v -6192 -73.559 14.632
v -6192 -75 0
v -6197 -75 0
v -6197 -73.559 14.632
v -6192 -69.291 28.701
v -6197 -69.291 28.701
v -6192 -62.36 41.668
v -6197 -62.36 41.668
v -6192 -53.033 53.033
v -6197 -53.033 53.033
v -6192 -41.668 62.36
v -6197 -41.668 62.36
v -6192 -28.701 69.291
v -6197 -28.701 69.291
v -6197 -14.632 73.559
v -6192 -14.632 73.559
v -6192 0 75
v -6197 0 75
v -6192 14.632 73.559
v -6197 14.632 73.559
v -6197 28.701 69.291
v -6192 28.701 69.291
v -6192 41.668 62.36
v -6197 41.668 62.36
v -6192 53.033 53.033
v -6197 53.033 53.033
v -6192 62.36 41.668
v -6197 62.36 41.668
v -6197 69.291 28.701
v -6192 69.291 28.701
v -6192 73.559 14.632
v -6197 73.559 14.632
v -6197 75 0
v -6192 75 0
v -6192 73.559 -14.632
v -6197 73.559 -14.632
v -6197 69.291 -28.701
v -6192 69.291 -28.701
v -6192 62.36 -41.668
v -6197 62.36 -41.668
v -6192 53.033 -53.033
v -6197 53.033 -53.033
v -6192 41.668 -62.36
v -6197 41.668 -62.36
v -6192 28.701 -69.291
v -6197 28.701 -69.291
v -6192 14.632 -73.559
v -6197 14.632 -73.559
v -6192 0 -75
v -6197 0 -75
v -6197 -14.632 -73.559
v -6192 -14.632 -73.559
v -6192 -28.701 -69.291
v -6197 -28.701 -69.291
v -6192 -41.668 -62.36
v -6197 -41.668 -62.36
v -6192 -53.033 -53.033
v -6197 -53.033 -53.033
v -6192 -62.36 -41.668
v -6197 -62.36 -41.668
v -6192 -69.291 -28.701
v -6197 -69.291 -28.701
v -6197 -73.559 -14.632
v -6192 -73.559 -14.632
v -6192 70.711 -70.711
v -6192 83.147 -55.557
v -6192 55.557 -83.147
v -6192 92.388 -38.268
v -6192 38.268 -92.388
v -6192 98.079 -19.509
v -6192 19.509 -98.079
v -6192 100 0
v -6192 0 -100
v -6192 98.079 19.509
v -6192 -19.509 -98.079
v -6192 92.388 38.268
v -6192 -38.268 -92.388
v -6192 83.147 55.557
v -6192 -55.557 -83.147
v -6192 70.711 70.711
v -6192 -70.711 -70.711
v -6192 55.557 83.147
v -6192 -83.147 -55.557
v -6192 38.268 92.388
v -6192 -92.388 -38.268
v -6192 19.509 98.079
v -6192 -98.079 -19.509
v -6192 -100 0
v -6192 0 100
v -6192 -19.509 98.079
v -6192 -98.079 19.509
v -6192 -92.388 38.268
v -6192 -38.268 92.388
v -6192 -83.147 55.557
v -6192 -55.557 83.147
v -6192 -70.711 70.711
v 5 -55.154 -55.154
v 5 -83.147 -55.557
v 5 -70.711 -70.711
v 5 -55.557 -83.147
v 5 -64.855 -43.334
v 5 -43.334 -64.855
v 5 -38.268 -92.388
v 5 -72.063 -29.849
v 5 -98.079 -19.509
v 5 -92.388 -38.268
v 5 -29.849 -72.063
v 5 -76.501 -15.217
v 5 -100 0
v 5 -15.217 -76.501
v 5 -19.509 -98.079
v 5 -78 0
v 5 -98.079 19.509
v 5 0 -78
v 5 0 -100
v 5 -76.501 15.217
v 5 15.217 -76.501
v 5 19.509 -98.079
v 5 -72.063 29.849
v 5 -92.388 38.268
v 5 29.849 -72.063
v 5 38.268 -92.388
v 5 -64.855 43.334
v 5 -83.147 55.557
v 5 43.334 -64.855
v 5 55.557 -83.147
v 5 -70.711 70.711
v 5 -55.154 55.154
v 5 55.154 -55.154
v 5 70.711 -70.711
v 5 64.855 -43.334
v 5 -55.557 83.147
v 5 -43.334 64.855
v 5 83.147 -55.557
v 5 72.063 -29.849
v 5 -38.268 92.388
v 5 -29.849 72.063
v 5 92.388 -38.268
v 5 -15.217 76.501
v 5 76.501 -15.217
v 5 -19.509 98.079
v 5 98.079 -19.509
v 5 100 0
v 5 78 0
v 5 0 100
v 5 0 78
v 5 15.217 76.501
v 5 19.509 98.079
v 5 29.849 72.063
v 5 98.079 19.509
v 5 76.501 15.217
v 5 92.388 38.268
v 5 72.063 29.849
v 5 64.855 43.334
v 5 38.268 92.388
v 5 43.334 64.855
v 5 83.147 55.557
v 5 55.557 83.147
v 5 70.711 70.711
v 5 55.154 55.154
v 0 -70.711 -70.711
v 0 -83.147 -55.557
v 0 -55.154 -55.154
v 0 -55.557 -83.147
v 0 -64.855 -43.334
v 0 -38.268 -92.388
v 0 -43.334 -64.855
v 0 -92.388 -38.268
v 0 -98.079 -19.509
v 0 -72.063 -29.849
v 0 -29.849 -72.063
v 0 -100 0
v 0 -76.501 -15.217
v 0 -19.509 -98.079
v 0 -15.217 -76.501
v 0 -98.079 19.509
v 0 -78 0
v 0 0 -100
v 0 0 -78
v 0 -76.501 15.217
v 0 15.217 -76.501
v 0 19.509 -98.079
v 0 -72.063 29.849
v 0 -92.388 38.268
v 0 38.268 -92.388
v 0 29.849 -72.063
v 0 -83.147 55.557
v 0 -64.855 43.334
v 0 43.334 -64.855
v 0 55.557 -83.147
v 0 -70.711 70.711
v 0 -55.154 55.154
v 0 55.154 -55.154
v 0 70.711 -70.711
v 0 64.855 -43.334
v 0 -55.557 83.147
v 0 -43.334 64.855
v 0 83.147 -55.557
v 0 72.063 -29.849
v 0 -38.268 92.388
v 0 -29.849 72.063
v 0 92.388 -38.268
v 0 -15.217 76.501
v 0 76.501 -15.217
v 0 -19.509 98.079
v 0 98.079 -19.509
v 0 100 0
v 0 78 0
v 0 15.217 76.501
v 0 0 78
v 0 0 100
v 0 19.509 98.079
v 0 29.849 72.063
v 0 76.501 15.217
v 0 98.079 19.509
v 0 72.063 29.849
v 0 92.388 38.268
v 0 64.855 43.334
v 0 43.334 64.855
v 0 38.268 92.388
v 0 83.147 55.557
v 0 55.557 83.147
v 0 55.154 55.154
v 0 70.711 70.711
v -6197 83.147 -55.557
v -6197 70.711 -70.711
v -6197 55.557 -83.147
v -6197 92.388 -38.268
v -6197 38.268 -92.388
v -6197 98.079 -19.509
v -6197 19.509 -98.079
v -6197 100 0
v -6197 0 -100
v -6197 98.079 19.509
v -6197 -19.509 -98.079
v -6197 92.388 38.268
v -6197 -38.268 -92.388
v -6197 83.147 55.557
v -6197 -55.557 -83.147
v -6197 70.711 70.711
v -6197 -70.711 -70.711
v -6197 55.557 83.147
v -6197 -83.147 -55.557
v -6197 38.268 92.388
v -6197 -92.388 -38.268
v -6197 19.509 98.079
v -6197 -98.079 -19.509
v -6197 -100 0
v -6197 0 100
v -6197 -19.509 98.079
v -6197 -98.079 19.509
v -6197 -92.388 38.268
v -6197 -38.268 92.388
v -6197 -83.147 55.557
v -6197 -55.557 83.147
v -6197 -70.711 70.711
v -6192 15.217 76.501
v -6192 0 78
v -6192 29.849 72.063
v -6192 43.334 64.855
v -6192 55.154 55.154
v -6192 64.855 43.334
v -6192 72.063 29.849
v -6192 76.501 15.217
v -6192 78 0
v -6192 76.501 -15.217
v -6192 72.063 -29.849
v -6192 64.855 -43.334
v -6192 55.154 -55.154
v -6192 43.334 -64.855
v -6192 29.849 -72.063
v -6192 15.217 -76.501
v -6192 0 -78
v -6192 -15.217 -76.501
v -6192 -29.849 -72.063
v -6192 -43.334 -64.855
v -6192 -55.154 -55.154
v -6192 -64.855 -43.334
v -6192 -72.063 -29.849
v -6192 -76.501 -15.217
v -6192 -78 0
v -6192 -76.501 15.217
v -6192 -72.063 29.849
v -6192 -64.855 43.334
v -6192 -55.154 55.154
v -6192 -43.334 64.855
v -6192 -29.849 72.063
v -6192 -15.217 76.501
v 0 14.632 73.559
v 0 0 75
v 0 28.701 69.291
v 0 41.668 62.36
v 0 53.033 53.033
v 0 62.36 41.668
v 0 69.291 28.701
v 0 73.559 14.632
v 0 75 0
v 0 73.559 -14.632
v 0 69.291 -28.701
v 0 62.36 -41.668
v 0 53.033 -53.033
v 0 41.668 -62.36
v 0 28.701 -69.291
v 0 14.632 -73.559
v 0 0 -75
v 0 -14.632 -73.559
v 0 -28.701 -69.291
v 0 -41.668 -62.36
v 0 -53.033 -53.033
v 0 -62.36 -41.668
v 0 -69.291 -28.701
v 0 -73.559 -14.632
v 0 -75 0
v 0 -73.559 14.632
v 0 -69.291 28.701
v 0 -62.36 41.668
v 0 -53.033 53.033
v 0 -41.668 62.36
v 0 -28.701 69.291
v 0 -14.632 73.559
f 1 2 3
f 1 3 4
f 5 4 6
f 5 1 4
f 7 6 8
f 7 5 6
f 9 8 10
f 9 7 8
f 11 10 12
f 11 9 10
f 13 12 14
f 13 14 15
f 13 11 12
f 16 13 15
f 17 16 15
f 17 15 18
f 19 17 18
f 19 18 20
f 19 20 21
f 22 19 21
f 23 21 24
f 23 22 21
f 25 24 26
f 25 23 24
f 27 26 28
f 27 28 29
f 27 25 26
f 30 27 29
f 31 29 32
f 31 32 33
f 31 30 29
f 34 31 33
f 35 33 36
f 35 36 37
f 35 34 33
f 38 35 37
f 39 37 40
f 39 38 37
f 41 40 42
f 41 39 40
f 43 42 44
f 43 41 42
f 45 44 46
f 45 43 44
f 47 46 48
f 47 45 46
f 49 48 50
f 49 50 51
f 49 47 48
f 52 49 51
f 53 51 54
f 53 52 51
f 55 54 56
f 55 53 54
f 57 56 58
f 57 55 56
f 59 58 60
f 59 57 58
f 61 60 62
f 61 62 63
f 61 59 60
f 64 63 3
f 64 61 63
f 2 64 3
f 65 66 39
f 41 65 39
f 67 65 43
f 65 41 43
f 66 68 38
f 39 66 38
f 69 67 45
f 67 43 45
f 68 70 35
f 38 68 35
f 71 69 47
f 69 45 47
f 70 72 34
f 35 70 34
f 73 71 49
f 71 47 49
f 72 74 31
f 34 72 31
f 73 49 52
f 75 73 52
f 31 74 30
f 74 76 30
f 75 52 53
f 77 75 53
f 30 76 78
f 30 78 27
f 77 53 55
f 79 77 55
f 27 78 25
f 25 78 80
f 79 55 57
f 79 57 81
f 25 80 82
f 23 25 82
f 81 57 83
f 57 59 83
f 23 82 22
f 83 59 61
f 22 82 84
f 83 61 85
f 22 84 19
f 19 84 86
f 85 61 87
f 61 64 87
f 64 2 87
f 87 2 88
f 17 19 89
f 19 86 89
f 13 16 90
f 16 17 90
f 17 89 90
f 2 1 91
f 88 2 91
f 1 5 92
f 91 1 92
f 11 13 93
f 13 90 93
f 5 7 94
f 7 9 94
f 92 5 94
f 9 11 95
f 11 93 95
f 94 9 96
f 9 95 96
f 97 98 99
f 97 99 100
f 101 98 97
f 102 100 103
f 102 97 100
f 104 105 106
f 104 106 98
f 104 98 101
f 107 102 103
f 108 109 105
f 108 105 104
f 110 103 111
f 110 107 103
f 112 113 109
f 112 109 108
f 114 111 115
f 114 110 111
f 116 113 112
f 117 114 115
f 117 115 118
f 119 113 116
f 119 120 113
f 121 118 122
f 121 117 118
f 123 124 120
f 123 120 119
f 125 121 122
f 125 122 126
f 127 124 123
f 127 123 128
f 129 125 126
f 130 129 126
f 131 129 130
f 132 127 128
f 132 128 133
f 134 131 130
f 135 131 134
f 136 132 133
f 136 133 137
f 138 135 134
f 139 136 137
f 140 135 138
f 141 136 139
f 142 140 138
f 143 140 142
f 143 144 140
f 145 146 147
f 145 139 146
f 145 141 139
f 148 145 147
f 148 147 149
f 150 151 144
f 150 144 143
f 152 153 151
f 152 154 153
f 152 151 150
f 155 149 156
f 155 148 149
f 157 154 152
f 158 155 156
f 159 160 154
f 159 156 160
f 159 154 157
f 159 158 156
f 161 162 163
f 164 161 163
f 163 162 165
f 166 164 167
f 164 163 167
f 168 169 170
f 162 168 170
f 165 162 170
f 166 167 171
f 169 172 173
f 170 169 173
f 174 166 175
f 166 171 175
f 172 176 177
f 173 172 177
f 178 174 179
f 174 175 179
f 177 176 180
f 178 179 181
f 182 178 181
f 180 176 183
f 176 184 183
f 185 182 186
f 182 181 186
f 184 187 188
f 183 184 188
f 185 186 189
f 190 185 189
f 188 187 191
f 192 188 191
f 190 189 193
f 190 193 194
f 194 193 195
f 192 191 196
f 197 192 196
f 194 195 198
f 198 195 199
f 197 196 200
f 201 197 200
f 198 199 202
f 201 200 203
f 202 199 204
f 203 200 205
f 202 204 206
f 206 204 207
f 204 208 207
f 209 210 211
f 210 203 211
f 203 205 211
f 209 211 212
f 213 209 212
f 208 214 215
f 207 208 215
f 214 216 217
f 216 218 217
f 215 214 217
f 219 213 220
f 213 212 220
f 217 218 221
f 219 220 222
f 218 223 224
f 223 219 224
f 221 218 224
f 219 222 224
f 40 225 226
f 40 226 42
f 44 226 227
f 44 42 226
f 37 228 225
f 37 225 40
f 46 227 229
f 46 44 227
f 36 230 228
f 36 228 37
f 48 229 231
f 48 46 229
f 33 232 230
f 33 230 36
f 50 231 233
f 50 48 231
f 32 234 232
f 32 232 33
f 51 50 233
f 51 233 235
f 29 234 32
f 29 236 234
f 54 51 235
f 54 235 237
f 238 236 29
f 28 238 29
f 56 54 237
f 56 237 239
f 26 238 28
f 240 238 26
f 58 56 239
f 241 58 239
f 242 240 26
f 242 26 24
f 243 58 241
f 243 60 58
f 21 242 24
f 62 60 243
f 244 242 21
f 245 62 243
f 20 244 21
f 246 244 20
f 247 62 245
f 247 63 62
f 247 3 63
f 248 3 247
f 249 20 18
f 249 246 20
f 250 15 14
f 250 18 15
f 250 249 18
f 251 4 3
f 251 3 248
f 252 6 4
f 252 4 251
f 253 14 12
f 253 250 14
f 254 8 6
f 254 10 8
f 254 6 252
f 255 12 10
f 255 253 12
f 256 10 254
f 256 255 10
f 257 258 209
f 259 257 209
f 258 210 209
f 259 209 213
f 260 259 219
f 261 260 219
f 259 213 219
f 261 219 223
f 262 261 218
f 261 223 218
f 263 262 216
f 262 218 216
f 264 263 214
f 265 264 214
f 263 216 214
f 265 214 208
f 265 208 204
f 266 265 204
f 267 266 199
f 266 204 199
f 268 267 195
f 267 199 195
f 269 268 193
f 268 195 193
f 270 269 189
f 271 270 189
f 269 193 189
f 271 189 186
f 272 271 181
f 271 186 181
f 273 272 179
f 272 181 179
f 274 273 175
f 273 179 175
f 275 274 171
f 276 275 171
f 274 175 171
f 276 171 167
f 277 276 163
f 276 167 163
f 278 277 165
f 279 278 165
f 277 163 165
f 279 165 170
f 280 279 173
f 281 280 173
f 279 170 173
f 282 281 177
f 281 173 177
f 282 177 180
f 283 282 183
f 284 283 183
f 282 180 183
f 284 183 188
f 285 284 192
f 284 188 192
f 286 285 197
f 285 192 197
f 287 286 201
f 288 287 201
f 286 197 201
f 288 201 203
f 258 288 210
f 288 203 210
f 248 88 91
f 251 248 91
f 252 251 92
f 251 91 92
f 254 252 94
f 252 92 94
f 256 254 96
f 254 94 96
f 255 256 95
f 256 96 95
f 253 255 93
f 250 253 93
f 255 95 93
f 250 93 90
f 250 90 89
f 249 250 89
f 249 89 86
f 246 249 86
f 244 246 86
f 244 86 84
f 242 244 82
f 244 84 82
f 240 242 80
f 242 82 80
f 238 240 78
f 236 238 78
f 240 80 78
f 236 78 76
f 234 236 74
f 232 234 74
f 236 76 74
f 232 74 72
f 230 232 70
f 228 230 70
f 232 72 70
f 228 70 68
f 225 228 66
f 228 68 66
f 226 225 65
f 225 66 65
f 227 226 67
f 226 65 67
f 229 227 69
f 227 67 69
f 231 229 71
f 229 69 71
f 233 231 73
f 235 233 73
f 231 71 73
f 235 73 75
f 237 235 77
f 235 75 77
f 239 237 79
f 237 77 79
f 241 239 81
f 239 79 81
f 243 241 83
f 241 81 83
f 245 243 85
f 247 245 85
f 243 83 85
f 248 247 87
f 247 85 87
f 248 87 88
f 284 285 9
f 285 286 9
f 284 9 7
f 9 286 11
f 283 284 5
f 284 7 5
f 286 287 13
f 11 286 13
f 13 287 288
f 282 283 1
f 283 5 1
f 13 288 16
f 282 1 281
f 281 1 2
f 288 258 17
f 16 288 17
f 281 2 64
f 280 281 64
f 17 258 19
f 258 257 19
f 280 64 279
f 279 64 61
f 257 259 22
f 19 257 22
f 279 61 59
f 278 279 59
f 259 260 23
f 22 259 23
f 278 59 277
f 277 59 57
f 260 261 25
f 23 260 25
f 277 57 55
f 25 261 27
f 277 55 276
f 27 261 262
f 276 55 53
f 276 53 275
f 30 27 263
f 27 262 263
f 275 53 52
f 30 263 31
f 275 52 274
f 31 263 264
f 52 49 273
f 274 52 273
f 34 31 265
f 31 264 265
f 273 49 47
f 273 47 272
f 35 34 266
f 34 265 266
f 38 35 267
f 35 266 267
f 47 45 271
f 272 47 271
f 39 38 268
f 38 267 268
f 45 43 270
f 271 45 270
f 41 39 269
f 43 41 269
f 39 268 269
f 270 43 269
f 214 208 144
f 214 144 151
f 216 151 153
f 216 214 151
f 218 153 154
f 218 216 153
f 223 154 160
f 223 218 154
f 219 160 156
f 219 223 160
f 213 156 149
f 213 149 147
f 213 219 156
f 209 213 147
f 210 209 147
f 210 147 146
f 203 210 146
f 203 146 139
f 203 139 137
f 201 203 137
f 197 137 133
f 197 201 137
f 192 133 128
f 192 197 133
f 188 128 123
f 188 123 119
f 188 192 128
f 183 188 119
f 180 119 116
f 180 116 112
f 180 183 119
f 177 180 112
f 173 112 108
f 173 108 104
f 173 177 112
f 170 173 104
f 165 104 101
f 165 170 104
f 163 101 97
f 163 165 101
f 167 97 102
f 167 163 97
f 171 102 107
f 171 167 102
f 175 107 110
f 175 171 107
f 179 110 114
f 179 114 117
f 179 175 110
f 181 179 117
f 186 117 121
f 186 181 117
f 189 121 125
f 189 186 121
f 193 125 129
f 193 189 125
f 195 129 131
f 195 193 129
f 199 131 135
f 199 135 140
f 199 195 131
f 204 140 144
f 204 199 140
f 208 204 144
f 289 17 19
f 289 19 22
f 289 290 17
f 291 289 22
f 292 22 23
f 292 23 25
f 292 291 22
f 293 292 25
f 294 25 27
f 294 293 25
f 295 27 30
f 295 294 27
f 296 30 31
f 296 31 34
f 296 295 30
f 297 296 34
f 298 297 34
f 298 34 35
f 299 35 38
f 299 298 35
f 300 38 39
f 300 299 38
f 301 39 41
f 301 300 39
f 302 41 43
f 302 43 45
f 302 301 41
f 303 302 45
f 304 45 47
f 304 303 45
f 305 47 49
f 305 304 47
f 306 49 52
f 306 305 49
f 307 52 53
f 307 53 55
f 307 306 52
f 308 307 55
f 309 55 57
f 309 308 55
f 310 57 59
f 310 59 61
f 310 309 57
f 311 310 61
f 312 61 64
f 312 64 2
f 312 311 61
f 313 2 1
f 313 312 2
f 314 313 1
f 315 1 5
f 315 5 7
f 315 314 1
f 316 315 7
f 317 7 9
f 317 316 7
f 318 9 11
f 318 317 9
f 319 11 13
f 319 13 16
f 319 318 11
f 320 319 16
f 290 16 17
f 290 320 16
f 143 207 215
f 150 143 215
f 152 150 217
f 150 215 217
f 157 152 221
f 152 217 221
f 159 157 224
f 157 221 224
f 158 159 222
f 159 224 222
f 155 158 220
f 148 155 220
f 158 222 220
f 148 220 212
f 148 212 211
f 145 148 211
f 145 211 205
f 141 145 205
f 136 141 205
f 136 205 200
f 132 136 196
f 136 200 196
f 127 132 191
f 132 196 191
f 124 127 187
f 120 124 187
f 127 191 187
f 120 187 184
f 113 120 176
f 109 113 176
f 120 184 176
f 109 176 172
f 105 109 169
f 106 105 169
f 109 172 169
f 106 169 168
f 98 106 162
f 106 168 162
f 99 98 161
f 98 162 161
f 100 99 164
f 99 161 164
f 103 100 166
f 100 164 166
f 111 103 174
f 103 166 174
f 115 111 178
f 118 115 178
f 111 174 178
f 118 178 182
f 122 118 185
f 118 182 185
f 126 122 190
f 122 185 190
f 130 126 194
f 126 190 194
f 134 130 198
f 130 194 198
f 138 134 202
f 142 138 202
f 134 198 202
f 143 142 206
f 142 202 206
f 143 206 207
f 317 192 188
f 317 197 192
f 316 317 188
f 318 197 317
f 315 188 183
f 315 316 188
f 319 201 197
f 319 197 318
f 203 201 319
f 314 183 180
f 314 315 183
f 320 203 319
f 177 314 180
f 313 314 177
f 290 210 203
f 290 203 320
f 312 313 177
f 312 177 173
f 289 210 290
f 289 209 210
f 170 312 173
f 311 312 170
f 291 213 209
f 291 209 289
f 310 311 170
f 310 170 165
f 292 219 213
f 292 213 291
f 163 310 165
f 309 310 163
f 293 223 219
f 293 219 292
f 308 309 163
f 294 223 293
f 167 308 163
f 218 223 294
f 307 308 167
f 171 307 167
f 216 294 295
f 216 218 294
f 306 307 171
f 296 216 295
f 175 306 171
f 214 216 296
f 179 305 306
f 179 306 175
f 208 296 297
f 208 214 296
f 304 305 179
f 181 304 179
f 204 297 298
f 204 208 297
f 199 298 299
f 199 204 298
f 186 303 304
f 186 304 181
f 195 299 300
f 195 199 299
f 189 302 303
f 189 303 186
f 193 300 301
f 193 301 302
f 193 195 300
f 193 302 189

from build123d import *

# Parameters (mm, degrees)
F0_W     = 6192
F0_H     = 3
F2_R     = 100
F2_R_2   = 78
F2_R_3   = 75
F3_DEPTH = 5
F4_R     = 100
F4_R_2   = 78
F5_DEPTH = 5


with BuildPart() as f1:
    # F0 (on Front) → F1 (revolve)
    with BuildSketch(Plane.XZ):
        with Locations((-3096, 76.5)):
            Rectangle(F0_W, F0_H)
    revolve(axis=Axis((-3096, 0, 0), (-1, 0, 0)))


with BuildPart() as f3:
    # F2 (on face) → F3 (new body)
    with BuildSketch(Plane(origin=(-6192, 0, 0), x_dir=(0, -1, 0), z_dir=(-1, 0, 0))):
        Circle(F2_R)
        Circle(F2_R_2, mode=Mode.SUBTRACT)
        Circle(F2_R_2)
        Circle(F2_R_3, mode=Mode.SUBTRACT)
    extrude(amount=F3_DEPTH)


with BuildPart() as f5:
    # F4 (on face) → F5 (new body)
    with BuildSketch(Plane.YZ):
        Circle(F4_R)
        Circle(F4_R_2, mode=Mode.SUBTRACT)
    extrude(amount=F5_DEPTH)


solid = Compound([f1.part, f3.part, f5.part])
